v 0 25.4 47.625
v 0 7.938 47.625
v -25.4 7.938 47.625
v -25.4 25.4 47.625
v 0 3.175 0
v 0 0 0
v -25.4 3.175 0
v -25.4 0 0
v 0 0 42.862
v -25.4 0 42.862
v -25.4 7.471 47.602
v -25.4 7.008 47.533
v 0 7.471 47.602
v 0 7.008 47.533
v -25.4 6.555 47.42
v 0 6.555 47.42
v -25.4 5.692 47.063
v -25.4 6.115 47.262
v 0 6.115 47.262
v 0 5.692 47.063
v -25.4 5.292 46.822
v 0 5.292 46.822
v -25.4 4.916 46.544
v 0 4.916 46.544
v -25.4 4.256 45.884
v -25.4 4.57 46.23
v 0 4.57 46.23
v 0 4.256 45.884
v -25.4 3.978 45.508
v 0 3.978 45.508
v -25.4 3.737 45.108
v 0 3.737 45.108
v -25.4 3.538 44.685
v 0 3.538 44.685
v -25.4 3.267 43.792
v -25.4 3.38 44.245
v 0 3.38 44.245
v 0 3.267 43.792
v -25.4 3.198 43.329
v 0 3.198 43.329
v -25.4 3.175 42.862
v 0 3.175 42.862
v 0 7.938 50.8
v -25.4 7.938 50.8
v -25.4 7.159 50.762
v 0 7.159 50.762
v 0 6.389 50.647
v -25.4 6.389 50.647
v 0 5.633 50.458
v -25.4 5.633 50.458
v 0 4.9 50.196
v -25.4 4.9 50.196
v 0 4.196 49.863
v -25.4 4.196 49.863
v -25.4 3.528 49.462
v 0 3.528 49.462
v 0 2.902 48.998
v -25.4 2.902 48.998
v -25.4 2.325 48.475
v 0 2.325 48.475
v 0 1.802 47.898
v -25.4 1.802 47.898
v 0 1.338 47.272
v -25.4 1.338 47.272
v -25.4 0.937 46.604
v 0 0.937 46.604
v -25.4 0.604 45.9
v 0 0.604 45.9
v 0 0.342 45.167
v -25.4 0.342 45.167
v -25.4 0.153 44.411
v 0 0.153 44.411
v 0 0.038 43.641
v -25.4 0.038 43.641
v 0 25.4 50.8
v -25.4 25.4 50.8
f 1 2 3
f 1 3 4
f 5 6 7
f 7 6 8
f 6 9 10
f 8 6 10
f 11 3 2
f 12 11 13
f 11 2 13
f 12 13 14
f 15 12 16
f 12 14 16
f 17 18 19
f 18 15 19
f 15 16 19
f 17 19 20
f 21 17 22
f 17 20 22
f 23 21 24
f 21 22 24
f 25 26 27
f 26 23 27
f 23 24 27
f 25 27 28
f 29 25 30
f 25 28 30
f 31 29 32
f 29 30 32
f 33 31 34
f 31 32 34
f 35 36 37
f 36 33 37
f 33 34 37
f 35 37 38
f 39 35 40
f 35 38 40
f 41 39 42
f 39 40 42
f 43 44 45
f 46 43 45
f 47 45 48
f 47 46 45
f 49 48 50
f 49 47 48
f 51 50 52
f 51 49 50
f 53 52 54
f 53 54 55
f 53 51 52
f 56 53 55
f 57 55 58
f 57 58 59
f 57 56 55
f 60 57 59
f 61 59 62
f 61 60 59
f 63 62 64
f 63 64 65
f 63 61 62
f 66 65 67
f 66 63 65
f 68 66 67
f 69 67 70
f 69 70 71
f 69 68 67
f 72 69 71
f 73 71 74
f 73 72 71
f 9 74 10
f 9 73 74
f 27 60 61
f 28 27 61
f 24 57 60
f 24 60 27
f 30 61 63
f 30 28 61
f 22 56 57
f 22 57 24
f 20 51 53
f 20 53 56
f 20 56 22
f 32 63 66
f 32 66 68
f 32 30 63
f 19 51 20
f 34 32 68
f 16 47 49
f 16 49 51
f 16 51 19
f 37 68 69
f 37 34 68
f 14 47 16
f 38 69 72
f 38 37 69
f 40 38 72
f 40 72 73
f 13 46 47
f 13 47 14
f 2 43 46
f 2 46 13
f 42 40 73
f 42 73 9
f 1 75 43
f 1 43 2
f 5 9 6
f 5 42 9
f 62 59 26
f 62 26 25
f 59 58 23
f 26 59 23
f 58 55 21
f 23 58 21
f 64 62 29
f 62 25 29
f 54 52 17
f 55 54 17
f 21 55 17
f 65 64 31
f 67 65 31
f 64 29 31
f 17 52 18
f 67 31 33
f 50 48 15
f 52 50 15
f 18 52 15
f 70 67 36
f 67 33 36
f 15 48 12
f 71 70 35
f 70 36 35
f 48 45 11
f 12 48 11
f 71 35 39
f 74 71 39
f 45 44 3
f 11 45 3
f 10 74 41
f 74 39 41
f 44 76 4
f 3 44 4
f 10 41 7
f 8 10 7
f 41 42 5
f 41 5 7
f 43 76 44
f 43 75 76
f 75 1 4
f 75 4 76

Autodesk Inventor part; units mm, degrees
ref_plane "YZ Plane" through (0, 0, 0) normal (1, 0, 0) x (0, 1, 0)
ref_plane "XZ Plane" through (0, 0, 0) normal (0, 1, 0) x (-1, 0, 0)
ref_plane "XY Plane" through (0, 0, 0) normal (0, 0, 1) x (1, 0, 0)
sketch "Sketch1" plane through (0, 0, 0) normal (0, 1, 0) x (-1, 0, 0)
  line L0 (0, 0) -> (25.4, 0)
  line L1 (25.4, 0) -> (25.4, 50.8)
  line L2 (25.4, 50.8) -> (0, 50.8)
  line L3 (0, 50.8) -> (0, 0)
  dimension "d0" = 25.4
  dimension "d1" = 50.8
extrude "Plate1" add sketch "Sketch1" along normal blind 3.175
sketch "Sketch2" plane through (0, 0, 47.625) normal (0, 0, 1) x (1, 0, 0)
  line L0 (-25.4, 0) -> (0, 0)
  line L1 (0, 0) -> (0, 25.4)
  line L2 (0, 25.4) -> (-25.4, 25.4)
  line L3 (-25.4, 25.4) -> (-25.4, 0)
edge flange "Flange1" height 25.4 angle 90 thickness 3.175 bend radius 4.7625 thickness toward (0, 0, 1) relief tear relief width 3.175 relief depth 1.5875 edges at (-12.7, 3.175, 50.8) wall of the first edge with corners at (-25.4, 0, 47.625) (0, 0, 47.625) (0, 25.4, 47.625) (-25.4, 25.4, 47.625)
bend "Bend1"
corner "Corner1"
equation "\"d2\" = Thickness"
equation "\"d3\" = BendReliefWidth"
equation "\"d4\" = BendReliefDepth"
equation "\"d5\" = MinimumRemnant"
equation "\"d6\" = TransitionRadius"
equation "\"d9\" = BendRadius"
equation "\"d10\" = CornerReliefSize"
equation "\"d11\" = GapSize"
equation "\"d12\" = JacobiRadiusSize"
equation "\"BendRadius\" = 1.5 * Thickness"
equation "\"BendReliefWidth\" = Thickness"
equation "\"BendReliefDepth\" = 0.5 * Thickness"
equation "\"CornerReliefSize\" = 4 * Thickness"
equation "\"MinimumRemnant\" = 2 * Thickness"
equation "\"TransitionRadius\" = BendRadius"
equation "\"JacobiRadiusSize\" = BendRadius"
equation "\"GapSize\" = Thickness"
equation "\"Thickness\" = 3.175"
properties part number "200557" material "Aluminum 5052 H32"
